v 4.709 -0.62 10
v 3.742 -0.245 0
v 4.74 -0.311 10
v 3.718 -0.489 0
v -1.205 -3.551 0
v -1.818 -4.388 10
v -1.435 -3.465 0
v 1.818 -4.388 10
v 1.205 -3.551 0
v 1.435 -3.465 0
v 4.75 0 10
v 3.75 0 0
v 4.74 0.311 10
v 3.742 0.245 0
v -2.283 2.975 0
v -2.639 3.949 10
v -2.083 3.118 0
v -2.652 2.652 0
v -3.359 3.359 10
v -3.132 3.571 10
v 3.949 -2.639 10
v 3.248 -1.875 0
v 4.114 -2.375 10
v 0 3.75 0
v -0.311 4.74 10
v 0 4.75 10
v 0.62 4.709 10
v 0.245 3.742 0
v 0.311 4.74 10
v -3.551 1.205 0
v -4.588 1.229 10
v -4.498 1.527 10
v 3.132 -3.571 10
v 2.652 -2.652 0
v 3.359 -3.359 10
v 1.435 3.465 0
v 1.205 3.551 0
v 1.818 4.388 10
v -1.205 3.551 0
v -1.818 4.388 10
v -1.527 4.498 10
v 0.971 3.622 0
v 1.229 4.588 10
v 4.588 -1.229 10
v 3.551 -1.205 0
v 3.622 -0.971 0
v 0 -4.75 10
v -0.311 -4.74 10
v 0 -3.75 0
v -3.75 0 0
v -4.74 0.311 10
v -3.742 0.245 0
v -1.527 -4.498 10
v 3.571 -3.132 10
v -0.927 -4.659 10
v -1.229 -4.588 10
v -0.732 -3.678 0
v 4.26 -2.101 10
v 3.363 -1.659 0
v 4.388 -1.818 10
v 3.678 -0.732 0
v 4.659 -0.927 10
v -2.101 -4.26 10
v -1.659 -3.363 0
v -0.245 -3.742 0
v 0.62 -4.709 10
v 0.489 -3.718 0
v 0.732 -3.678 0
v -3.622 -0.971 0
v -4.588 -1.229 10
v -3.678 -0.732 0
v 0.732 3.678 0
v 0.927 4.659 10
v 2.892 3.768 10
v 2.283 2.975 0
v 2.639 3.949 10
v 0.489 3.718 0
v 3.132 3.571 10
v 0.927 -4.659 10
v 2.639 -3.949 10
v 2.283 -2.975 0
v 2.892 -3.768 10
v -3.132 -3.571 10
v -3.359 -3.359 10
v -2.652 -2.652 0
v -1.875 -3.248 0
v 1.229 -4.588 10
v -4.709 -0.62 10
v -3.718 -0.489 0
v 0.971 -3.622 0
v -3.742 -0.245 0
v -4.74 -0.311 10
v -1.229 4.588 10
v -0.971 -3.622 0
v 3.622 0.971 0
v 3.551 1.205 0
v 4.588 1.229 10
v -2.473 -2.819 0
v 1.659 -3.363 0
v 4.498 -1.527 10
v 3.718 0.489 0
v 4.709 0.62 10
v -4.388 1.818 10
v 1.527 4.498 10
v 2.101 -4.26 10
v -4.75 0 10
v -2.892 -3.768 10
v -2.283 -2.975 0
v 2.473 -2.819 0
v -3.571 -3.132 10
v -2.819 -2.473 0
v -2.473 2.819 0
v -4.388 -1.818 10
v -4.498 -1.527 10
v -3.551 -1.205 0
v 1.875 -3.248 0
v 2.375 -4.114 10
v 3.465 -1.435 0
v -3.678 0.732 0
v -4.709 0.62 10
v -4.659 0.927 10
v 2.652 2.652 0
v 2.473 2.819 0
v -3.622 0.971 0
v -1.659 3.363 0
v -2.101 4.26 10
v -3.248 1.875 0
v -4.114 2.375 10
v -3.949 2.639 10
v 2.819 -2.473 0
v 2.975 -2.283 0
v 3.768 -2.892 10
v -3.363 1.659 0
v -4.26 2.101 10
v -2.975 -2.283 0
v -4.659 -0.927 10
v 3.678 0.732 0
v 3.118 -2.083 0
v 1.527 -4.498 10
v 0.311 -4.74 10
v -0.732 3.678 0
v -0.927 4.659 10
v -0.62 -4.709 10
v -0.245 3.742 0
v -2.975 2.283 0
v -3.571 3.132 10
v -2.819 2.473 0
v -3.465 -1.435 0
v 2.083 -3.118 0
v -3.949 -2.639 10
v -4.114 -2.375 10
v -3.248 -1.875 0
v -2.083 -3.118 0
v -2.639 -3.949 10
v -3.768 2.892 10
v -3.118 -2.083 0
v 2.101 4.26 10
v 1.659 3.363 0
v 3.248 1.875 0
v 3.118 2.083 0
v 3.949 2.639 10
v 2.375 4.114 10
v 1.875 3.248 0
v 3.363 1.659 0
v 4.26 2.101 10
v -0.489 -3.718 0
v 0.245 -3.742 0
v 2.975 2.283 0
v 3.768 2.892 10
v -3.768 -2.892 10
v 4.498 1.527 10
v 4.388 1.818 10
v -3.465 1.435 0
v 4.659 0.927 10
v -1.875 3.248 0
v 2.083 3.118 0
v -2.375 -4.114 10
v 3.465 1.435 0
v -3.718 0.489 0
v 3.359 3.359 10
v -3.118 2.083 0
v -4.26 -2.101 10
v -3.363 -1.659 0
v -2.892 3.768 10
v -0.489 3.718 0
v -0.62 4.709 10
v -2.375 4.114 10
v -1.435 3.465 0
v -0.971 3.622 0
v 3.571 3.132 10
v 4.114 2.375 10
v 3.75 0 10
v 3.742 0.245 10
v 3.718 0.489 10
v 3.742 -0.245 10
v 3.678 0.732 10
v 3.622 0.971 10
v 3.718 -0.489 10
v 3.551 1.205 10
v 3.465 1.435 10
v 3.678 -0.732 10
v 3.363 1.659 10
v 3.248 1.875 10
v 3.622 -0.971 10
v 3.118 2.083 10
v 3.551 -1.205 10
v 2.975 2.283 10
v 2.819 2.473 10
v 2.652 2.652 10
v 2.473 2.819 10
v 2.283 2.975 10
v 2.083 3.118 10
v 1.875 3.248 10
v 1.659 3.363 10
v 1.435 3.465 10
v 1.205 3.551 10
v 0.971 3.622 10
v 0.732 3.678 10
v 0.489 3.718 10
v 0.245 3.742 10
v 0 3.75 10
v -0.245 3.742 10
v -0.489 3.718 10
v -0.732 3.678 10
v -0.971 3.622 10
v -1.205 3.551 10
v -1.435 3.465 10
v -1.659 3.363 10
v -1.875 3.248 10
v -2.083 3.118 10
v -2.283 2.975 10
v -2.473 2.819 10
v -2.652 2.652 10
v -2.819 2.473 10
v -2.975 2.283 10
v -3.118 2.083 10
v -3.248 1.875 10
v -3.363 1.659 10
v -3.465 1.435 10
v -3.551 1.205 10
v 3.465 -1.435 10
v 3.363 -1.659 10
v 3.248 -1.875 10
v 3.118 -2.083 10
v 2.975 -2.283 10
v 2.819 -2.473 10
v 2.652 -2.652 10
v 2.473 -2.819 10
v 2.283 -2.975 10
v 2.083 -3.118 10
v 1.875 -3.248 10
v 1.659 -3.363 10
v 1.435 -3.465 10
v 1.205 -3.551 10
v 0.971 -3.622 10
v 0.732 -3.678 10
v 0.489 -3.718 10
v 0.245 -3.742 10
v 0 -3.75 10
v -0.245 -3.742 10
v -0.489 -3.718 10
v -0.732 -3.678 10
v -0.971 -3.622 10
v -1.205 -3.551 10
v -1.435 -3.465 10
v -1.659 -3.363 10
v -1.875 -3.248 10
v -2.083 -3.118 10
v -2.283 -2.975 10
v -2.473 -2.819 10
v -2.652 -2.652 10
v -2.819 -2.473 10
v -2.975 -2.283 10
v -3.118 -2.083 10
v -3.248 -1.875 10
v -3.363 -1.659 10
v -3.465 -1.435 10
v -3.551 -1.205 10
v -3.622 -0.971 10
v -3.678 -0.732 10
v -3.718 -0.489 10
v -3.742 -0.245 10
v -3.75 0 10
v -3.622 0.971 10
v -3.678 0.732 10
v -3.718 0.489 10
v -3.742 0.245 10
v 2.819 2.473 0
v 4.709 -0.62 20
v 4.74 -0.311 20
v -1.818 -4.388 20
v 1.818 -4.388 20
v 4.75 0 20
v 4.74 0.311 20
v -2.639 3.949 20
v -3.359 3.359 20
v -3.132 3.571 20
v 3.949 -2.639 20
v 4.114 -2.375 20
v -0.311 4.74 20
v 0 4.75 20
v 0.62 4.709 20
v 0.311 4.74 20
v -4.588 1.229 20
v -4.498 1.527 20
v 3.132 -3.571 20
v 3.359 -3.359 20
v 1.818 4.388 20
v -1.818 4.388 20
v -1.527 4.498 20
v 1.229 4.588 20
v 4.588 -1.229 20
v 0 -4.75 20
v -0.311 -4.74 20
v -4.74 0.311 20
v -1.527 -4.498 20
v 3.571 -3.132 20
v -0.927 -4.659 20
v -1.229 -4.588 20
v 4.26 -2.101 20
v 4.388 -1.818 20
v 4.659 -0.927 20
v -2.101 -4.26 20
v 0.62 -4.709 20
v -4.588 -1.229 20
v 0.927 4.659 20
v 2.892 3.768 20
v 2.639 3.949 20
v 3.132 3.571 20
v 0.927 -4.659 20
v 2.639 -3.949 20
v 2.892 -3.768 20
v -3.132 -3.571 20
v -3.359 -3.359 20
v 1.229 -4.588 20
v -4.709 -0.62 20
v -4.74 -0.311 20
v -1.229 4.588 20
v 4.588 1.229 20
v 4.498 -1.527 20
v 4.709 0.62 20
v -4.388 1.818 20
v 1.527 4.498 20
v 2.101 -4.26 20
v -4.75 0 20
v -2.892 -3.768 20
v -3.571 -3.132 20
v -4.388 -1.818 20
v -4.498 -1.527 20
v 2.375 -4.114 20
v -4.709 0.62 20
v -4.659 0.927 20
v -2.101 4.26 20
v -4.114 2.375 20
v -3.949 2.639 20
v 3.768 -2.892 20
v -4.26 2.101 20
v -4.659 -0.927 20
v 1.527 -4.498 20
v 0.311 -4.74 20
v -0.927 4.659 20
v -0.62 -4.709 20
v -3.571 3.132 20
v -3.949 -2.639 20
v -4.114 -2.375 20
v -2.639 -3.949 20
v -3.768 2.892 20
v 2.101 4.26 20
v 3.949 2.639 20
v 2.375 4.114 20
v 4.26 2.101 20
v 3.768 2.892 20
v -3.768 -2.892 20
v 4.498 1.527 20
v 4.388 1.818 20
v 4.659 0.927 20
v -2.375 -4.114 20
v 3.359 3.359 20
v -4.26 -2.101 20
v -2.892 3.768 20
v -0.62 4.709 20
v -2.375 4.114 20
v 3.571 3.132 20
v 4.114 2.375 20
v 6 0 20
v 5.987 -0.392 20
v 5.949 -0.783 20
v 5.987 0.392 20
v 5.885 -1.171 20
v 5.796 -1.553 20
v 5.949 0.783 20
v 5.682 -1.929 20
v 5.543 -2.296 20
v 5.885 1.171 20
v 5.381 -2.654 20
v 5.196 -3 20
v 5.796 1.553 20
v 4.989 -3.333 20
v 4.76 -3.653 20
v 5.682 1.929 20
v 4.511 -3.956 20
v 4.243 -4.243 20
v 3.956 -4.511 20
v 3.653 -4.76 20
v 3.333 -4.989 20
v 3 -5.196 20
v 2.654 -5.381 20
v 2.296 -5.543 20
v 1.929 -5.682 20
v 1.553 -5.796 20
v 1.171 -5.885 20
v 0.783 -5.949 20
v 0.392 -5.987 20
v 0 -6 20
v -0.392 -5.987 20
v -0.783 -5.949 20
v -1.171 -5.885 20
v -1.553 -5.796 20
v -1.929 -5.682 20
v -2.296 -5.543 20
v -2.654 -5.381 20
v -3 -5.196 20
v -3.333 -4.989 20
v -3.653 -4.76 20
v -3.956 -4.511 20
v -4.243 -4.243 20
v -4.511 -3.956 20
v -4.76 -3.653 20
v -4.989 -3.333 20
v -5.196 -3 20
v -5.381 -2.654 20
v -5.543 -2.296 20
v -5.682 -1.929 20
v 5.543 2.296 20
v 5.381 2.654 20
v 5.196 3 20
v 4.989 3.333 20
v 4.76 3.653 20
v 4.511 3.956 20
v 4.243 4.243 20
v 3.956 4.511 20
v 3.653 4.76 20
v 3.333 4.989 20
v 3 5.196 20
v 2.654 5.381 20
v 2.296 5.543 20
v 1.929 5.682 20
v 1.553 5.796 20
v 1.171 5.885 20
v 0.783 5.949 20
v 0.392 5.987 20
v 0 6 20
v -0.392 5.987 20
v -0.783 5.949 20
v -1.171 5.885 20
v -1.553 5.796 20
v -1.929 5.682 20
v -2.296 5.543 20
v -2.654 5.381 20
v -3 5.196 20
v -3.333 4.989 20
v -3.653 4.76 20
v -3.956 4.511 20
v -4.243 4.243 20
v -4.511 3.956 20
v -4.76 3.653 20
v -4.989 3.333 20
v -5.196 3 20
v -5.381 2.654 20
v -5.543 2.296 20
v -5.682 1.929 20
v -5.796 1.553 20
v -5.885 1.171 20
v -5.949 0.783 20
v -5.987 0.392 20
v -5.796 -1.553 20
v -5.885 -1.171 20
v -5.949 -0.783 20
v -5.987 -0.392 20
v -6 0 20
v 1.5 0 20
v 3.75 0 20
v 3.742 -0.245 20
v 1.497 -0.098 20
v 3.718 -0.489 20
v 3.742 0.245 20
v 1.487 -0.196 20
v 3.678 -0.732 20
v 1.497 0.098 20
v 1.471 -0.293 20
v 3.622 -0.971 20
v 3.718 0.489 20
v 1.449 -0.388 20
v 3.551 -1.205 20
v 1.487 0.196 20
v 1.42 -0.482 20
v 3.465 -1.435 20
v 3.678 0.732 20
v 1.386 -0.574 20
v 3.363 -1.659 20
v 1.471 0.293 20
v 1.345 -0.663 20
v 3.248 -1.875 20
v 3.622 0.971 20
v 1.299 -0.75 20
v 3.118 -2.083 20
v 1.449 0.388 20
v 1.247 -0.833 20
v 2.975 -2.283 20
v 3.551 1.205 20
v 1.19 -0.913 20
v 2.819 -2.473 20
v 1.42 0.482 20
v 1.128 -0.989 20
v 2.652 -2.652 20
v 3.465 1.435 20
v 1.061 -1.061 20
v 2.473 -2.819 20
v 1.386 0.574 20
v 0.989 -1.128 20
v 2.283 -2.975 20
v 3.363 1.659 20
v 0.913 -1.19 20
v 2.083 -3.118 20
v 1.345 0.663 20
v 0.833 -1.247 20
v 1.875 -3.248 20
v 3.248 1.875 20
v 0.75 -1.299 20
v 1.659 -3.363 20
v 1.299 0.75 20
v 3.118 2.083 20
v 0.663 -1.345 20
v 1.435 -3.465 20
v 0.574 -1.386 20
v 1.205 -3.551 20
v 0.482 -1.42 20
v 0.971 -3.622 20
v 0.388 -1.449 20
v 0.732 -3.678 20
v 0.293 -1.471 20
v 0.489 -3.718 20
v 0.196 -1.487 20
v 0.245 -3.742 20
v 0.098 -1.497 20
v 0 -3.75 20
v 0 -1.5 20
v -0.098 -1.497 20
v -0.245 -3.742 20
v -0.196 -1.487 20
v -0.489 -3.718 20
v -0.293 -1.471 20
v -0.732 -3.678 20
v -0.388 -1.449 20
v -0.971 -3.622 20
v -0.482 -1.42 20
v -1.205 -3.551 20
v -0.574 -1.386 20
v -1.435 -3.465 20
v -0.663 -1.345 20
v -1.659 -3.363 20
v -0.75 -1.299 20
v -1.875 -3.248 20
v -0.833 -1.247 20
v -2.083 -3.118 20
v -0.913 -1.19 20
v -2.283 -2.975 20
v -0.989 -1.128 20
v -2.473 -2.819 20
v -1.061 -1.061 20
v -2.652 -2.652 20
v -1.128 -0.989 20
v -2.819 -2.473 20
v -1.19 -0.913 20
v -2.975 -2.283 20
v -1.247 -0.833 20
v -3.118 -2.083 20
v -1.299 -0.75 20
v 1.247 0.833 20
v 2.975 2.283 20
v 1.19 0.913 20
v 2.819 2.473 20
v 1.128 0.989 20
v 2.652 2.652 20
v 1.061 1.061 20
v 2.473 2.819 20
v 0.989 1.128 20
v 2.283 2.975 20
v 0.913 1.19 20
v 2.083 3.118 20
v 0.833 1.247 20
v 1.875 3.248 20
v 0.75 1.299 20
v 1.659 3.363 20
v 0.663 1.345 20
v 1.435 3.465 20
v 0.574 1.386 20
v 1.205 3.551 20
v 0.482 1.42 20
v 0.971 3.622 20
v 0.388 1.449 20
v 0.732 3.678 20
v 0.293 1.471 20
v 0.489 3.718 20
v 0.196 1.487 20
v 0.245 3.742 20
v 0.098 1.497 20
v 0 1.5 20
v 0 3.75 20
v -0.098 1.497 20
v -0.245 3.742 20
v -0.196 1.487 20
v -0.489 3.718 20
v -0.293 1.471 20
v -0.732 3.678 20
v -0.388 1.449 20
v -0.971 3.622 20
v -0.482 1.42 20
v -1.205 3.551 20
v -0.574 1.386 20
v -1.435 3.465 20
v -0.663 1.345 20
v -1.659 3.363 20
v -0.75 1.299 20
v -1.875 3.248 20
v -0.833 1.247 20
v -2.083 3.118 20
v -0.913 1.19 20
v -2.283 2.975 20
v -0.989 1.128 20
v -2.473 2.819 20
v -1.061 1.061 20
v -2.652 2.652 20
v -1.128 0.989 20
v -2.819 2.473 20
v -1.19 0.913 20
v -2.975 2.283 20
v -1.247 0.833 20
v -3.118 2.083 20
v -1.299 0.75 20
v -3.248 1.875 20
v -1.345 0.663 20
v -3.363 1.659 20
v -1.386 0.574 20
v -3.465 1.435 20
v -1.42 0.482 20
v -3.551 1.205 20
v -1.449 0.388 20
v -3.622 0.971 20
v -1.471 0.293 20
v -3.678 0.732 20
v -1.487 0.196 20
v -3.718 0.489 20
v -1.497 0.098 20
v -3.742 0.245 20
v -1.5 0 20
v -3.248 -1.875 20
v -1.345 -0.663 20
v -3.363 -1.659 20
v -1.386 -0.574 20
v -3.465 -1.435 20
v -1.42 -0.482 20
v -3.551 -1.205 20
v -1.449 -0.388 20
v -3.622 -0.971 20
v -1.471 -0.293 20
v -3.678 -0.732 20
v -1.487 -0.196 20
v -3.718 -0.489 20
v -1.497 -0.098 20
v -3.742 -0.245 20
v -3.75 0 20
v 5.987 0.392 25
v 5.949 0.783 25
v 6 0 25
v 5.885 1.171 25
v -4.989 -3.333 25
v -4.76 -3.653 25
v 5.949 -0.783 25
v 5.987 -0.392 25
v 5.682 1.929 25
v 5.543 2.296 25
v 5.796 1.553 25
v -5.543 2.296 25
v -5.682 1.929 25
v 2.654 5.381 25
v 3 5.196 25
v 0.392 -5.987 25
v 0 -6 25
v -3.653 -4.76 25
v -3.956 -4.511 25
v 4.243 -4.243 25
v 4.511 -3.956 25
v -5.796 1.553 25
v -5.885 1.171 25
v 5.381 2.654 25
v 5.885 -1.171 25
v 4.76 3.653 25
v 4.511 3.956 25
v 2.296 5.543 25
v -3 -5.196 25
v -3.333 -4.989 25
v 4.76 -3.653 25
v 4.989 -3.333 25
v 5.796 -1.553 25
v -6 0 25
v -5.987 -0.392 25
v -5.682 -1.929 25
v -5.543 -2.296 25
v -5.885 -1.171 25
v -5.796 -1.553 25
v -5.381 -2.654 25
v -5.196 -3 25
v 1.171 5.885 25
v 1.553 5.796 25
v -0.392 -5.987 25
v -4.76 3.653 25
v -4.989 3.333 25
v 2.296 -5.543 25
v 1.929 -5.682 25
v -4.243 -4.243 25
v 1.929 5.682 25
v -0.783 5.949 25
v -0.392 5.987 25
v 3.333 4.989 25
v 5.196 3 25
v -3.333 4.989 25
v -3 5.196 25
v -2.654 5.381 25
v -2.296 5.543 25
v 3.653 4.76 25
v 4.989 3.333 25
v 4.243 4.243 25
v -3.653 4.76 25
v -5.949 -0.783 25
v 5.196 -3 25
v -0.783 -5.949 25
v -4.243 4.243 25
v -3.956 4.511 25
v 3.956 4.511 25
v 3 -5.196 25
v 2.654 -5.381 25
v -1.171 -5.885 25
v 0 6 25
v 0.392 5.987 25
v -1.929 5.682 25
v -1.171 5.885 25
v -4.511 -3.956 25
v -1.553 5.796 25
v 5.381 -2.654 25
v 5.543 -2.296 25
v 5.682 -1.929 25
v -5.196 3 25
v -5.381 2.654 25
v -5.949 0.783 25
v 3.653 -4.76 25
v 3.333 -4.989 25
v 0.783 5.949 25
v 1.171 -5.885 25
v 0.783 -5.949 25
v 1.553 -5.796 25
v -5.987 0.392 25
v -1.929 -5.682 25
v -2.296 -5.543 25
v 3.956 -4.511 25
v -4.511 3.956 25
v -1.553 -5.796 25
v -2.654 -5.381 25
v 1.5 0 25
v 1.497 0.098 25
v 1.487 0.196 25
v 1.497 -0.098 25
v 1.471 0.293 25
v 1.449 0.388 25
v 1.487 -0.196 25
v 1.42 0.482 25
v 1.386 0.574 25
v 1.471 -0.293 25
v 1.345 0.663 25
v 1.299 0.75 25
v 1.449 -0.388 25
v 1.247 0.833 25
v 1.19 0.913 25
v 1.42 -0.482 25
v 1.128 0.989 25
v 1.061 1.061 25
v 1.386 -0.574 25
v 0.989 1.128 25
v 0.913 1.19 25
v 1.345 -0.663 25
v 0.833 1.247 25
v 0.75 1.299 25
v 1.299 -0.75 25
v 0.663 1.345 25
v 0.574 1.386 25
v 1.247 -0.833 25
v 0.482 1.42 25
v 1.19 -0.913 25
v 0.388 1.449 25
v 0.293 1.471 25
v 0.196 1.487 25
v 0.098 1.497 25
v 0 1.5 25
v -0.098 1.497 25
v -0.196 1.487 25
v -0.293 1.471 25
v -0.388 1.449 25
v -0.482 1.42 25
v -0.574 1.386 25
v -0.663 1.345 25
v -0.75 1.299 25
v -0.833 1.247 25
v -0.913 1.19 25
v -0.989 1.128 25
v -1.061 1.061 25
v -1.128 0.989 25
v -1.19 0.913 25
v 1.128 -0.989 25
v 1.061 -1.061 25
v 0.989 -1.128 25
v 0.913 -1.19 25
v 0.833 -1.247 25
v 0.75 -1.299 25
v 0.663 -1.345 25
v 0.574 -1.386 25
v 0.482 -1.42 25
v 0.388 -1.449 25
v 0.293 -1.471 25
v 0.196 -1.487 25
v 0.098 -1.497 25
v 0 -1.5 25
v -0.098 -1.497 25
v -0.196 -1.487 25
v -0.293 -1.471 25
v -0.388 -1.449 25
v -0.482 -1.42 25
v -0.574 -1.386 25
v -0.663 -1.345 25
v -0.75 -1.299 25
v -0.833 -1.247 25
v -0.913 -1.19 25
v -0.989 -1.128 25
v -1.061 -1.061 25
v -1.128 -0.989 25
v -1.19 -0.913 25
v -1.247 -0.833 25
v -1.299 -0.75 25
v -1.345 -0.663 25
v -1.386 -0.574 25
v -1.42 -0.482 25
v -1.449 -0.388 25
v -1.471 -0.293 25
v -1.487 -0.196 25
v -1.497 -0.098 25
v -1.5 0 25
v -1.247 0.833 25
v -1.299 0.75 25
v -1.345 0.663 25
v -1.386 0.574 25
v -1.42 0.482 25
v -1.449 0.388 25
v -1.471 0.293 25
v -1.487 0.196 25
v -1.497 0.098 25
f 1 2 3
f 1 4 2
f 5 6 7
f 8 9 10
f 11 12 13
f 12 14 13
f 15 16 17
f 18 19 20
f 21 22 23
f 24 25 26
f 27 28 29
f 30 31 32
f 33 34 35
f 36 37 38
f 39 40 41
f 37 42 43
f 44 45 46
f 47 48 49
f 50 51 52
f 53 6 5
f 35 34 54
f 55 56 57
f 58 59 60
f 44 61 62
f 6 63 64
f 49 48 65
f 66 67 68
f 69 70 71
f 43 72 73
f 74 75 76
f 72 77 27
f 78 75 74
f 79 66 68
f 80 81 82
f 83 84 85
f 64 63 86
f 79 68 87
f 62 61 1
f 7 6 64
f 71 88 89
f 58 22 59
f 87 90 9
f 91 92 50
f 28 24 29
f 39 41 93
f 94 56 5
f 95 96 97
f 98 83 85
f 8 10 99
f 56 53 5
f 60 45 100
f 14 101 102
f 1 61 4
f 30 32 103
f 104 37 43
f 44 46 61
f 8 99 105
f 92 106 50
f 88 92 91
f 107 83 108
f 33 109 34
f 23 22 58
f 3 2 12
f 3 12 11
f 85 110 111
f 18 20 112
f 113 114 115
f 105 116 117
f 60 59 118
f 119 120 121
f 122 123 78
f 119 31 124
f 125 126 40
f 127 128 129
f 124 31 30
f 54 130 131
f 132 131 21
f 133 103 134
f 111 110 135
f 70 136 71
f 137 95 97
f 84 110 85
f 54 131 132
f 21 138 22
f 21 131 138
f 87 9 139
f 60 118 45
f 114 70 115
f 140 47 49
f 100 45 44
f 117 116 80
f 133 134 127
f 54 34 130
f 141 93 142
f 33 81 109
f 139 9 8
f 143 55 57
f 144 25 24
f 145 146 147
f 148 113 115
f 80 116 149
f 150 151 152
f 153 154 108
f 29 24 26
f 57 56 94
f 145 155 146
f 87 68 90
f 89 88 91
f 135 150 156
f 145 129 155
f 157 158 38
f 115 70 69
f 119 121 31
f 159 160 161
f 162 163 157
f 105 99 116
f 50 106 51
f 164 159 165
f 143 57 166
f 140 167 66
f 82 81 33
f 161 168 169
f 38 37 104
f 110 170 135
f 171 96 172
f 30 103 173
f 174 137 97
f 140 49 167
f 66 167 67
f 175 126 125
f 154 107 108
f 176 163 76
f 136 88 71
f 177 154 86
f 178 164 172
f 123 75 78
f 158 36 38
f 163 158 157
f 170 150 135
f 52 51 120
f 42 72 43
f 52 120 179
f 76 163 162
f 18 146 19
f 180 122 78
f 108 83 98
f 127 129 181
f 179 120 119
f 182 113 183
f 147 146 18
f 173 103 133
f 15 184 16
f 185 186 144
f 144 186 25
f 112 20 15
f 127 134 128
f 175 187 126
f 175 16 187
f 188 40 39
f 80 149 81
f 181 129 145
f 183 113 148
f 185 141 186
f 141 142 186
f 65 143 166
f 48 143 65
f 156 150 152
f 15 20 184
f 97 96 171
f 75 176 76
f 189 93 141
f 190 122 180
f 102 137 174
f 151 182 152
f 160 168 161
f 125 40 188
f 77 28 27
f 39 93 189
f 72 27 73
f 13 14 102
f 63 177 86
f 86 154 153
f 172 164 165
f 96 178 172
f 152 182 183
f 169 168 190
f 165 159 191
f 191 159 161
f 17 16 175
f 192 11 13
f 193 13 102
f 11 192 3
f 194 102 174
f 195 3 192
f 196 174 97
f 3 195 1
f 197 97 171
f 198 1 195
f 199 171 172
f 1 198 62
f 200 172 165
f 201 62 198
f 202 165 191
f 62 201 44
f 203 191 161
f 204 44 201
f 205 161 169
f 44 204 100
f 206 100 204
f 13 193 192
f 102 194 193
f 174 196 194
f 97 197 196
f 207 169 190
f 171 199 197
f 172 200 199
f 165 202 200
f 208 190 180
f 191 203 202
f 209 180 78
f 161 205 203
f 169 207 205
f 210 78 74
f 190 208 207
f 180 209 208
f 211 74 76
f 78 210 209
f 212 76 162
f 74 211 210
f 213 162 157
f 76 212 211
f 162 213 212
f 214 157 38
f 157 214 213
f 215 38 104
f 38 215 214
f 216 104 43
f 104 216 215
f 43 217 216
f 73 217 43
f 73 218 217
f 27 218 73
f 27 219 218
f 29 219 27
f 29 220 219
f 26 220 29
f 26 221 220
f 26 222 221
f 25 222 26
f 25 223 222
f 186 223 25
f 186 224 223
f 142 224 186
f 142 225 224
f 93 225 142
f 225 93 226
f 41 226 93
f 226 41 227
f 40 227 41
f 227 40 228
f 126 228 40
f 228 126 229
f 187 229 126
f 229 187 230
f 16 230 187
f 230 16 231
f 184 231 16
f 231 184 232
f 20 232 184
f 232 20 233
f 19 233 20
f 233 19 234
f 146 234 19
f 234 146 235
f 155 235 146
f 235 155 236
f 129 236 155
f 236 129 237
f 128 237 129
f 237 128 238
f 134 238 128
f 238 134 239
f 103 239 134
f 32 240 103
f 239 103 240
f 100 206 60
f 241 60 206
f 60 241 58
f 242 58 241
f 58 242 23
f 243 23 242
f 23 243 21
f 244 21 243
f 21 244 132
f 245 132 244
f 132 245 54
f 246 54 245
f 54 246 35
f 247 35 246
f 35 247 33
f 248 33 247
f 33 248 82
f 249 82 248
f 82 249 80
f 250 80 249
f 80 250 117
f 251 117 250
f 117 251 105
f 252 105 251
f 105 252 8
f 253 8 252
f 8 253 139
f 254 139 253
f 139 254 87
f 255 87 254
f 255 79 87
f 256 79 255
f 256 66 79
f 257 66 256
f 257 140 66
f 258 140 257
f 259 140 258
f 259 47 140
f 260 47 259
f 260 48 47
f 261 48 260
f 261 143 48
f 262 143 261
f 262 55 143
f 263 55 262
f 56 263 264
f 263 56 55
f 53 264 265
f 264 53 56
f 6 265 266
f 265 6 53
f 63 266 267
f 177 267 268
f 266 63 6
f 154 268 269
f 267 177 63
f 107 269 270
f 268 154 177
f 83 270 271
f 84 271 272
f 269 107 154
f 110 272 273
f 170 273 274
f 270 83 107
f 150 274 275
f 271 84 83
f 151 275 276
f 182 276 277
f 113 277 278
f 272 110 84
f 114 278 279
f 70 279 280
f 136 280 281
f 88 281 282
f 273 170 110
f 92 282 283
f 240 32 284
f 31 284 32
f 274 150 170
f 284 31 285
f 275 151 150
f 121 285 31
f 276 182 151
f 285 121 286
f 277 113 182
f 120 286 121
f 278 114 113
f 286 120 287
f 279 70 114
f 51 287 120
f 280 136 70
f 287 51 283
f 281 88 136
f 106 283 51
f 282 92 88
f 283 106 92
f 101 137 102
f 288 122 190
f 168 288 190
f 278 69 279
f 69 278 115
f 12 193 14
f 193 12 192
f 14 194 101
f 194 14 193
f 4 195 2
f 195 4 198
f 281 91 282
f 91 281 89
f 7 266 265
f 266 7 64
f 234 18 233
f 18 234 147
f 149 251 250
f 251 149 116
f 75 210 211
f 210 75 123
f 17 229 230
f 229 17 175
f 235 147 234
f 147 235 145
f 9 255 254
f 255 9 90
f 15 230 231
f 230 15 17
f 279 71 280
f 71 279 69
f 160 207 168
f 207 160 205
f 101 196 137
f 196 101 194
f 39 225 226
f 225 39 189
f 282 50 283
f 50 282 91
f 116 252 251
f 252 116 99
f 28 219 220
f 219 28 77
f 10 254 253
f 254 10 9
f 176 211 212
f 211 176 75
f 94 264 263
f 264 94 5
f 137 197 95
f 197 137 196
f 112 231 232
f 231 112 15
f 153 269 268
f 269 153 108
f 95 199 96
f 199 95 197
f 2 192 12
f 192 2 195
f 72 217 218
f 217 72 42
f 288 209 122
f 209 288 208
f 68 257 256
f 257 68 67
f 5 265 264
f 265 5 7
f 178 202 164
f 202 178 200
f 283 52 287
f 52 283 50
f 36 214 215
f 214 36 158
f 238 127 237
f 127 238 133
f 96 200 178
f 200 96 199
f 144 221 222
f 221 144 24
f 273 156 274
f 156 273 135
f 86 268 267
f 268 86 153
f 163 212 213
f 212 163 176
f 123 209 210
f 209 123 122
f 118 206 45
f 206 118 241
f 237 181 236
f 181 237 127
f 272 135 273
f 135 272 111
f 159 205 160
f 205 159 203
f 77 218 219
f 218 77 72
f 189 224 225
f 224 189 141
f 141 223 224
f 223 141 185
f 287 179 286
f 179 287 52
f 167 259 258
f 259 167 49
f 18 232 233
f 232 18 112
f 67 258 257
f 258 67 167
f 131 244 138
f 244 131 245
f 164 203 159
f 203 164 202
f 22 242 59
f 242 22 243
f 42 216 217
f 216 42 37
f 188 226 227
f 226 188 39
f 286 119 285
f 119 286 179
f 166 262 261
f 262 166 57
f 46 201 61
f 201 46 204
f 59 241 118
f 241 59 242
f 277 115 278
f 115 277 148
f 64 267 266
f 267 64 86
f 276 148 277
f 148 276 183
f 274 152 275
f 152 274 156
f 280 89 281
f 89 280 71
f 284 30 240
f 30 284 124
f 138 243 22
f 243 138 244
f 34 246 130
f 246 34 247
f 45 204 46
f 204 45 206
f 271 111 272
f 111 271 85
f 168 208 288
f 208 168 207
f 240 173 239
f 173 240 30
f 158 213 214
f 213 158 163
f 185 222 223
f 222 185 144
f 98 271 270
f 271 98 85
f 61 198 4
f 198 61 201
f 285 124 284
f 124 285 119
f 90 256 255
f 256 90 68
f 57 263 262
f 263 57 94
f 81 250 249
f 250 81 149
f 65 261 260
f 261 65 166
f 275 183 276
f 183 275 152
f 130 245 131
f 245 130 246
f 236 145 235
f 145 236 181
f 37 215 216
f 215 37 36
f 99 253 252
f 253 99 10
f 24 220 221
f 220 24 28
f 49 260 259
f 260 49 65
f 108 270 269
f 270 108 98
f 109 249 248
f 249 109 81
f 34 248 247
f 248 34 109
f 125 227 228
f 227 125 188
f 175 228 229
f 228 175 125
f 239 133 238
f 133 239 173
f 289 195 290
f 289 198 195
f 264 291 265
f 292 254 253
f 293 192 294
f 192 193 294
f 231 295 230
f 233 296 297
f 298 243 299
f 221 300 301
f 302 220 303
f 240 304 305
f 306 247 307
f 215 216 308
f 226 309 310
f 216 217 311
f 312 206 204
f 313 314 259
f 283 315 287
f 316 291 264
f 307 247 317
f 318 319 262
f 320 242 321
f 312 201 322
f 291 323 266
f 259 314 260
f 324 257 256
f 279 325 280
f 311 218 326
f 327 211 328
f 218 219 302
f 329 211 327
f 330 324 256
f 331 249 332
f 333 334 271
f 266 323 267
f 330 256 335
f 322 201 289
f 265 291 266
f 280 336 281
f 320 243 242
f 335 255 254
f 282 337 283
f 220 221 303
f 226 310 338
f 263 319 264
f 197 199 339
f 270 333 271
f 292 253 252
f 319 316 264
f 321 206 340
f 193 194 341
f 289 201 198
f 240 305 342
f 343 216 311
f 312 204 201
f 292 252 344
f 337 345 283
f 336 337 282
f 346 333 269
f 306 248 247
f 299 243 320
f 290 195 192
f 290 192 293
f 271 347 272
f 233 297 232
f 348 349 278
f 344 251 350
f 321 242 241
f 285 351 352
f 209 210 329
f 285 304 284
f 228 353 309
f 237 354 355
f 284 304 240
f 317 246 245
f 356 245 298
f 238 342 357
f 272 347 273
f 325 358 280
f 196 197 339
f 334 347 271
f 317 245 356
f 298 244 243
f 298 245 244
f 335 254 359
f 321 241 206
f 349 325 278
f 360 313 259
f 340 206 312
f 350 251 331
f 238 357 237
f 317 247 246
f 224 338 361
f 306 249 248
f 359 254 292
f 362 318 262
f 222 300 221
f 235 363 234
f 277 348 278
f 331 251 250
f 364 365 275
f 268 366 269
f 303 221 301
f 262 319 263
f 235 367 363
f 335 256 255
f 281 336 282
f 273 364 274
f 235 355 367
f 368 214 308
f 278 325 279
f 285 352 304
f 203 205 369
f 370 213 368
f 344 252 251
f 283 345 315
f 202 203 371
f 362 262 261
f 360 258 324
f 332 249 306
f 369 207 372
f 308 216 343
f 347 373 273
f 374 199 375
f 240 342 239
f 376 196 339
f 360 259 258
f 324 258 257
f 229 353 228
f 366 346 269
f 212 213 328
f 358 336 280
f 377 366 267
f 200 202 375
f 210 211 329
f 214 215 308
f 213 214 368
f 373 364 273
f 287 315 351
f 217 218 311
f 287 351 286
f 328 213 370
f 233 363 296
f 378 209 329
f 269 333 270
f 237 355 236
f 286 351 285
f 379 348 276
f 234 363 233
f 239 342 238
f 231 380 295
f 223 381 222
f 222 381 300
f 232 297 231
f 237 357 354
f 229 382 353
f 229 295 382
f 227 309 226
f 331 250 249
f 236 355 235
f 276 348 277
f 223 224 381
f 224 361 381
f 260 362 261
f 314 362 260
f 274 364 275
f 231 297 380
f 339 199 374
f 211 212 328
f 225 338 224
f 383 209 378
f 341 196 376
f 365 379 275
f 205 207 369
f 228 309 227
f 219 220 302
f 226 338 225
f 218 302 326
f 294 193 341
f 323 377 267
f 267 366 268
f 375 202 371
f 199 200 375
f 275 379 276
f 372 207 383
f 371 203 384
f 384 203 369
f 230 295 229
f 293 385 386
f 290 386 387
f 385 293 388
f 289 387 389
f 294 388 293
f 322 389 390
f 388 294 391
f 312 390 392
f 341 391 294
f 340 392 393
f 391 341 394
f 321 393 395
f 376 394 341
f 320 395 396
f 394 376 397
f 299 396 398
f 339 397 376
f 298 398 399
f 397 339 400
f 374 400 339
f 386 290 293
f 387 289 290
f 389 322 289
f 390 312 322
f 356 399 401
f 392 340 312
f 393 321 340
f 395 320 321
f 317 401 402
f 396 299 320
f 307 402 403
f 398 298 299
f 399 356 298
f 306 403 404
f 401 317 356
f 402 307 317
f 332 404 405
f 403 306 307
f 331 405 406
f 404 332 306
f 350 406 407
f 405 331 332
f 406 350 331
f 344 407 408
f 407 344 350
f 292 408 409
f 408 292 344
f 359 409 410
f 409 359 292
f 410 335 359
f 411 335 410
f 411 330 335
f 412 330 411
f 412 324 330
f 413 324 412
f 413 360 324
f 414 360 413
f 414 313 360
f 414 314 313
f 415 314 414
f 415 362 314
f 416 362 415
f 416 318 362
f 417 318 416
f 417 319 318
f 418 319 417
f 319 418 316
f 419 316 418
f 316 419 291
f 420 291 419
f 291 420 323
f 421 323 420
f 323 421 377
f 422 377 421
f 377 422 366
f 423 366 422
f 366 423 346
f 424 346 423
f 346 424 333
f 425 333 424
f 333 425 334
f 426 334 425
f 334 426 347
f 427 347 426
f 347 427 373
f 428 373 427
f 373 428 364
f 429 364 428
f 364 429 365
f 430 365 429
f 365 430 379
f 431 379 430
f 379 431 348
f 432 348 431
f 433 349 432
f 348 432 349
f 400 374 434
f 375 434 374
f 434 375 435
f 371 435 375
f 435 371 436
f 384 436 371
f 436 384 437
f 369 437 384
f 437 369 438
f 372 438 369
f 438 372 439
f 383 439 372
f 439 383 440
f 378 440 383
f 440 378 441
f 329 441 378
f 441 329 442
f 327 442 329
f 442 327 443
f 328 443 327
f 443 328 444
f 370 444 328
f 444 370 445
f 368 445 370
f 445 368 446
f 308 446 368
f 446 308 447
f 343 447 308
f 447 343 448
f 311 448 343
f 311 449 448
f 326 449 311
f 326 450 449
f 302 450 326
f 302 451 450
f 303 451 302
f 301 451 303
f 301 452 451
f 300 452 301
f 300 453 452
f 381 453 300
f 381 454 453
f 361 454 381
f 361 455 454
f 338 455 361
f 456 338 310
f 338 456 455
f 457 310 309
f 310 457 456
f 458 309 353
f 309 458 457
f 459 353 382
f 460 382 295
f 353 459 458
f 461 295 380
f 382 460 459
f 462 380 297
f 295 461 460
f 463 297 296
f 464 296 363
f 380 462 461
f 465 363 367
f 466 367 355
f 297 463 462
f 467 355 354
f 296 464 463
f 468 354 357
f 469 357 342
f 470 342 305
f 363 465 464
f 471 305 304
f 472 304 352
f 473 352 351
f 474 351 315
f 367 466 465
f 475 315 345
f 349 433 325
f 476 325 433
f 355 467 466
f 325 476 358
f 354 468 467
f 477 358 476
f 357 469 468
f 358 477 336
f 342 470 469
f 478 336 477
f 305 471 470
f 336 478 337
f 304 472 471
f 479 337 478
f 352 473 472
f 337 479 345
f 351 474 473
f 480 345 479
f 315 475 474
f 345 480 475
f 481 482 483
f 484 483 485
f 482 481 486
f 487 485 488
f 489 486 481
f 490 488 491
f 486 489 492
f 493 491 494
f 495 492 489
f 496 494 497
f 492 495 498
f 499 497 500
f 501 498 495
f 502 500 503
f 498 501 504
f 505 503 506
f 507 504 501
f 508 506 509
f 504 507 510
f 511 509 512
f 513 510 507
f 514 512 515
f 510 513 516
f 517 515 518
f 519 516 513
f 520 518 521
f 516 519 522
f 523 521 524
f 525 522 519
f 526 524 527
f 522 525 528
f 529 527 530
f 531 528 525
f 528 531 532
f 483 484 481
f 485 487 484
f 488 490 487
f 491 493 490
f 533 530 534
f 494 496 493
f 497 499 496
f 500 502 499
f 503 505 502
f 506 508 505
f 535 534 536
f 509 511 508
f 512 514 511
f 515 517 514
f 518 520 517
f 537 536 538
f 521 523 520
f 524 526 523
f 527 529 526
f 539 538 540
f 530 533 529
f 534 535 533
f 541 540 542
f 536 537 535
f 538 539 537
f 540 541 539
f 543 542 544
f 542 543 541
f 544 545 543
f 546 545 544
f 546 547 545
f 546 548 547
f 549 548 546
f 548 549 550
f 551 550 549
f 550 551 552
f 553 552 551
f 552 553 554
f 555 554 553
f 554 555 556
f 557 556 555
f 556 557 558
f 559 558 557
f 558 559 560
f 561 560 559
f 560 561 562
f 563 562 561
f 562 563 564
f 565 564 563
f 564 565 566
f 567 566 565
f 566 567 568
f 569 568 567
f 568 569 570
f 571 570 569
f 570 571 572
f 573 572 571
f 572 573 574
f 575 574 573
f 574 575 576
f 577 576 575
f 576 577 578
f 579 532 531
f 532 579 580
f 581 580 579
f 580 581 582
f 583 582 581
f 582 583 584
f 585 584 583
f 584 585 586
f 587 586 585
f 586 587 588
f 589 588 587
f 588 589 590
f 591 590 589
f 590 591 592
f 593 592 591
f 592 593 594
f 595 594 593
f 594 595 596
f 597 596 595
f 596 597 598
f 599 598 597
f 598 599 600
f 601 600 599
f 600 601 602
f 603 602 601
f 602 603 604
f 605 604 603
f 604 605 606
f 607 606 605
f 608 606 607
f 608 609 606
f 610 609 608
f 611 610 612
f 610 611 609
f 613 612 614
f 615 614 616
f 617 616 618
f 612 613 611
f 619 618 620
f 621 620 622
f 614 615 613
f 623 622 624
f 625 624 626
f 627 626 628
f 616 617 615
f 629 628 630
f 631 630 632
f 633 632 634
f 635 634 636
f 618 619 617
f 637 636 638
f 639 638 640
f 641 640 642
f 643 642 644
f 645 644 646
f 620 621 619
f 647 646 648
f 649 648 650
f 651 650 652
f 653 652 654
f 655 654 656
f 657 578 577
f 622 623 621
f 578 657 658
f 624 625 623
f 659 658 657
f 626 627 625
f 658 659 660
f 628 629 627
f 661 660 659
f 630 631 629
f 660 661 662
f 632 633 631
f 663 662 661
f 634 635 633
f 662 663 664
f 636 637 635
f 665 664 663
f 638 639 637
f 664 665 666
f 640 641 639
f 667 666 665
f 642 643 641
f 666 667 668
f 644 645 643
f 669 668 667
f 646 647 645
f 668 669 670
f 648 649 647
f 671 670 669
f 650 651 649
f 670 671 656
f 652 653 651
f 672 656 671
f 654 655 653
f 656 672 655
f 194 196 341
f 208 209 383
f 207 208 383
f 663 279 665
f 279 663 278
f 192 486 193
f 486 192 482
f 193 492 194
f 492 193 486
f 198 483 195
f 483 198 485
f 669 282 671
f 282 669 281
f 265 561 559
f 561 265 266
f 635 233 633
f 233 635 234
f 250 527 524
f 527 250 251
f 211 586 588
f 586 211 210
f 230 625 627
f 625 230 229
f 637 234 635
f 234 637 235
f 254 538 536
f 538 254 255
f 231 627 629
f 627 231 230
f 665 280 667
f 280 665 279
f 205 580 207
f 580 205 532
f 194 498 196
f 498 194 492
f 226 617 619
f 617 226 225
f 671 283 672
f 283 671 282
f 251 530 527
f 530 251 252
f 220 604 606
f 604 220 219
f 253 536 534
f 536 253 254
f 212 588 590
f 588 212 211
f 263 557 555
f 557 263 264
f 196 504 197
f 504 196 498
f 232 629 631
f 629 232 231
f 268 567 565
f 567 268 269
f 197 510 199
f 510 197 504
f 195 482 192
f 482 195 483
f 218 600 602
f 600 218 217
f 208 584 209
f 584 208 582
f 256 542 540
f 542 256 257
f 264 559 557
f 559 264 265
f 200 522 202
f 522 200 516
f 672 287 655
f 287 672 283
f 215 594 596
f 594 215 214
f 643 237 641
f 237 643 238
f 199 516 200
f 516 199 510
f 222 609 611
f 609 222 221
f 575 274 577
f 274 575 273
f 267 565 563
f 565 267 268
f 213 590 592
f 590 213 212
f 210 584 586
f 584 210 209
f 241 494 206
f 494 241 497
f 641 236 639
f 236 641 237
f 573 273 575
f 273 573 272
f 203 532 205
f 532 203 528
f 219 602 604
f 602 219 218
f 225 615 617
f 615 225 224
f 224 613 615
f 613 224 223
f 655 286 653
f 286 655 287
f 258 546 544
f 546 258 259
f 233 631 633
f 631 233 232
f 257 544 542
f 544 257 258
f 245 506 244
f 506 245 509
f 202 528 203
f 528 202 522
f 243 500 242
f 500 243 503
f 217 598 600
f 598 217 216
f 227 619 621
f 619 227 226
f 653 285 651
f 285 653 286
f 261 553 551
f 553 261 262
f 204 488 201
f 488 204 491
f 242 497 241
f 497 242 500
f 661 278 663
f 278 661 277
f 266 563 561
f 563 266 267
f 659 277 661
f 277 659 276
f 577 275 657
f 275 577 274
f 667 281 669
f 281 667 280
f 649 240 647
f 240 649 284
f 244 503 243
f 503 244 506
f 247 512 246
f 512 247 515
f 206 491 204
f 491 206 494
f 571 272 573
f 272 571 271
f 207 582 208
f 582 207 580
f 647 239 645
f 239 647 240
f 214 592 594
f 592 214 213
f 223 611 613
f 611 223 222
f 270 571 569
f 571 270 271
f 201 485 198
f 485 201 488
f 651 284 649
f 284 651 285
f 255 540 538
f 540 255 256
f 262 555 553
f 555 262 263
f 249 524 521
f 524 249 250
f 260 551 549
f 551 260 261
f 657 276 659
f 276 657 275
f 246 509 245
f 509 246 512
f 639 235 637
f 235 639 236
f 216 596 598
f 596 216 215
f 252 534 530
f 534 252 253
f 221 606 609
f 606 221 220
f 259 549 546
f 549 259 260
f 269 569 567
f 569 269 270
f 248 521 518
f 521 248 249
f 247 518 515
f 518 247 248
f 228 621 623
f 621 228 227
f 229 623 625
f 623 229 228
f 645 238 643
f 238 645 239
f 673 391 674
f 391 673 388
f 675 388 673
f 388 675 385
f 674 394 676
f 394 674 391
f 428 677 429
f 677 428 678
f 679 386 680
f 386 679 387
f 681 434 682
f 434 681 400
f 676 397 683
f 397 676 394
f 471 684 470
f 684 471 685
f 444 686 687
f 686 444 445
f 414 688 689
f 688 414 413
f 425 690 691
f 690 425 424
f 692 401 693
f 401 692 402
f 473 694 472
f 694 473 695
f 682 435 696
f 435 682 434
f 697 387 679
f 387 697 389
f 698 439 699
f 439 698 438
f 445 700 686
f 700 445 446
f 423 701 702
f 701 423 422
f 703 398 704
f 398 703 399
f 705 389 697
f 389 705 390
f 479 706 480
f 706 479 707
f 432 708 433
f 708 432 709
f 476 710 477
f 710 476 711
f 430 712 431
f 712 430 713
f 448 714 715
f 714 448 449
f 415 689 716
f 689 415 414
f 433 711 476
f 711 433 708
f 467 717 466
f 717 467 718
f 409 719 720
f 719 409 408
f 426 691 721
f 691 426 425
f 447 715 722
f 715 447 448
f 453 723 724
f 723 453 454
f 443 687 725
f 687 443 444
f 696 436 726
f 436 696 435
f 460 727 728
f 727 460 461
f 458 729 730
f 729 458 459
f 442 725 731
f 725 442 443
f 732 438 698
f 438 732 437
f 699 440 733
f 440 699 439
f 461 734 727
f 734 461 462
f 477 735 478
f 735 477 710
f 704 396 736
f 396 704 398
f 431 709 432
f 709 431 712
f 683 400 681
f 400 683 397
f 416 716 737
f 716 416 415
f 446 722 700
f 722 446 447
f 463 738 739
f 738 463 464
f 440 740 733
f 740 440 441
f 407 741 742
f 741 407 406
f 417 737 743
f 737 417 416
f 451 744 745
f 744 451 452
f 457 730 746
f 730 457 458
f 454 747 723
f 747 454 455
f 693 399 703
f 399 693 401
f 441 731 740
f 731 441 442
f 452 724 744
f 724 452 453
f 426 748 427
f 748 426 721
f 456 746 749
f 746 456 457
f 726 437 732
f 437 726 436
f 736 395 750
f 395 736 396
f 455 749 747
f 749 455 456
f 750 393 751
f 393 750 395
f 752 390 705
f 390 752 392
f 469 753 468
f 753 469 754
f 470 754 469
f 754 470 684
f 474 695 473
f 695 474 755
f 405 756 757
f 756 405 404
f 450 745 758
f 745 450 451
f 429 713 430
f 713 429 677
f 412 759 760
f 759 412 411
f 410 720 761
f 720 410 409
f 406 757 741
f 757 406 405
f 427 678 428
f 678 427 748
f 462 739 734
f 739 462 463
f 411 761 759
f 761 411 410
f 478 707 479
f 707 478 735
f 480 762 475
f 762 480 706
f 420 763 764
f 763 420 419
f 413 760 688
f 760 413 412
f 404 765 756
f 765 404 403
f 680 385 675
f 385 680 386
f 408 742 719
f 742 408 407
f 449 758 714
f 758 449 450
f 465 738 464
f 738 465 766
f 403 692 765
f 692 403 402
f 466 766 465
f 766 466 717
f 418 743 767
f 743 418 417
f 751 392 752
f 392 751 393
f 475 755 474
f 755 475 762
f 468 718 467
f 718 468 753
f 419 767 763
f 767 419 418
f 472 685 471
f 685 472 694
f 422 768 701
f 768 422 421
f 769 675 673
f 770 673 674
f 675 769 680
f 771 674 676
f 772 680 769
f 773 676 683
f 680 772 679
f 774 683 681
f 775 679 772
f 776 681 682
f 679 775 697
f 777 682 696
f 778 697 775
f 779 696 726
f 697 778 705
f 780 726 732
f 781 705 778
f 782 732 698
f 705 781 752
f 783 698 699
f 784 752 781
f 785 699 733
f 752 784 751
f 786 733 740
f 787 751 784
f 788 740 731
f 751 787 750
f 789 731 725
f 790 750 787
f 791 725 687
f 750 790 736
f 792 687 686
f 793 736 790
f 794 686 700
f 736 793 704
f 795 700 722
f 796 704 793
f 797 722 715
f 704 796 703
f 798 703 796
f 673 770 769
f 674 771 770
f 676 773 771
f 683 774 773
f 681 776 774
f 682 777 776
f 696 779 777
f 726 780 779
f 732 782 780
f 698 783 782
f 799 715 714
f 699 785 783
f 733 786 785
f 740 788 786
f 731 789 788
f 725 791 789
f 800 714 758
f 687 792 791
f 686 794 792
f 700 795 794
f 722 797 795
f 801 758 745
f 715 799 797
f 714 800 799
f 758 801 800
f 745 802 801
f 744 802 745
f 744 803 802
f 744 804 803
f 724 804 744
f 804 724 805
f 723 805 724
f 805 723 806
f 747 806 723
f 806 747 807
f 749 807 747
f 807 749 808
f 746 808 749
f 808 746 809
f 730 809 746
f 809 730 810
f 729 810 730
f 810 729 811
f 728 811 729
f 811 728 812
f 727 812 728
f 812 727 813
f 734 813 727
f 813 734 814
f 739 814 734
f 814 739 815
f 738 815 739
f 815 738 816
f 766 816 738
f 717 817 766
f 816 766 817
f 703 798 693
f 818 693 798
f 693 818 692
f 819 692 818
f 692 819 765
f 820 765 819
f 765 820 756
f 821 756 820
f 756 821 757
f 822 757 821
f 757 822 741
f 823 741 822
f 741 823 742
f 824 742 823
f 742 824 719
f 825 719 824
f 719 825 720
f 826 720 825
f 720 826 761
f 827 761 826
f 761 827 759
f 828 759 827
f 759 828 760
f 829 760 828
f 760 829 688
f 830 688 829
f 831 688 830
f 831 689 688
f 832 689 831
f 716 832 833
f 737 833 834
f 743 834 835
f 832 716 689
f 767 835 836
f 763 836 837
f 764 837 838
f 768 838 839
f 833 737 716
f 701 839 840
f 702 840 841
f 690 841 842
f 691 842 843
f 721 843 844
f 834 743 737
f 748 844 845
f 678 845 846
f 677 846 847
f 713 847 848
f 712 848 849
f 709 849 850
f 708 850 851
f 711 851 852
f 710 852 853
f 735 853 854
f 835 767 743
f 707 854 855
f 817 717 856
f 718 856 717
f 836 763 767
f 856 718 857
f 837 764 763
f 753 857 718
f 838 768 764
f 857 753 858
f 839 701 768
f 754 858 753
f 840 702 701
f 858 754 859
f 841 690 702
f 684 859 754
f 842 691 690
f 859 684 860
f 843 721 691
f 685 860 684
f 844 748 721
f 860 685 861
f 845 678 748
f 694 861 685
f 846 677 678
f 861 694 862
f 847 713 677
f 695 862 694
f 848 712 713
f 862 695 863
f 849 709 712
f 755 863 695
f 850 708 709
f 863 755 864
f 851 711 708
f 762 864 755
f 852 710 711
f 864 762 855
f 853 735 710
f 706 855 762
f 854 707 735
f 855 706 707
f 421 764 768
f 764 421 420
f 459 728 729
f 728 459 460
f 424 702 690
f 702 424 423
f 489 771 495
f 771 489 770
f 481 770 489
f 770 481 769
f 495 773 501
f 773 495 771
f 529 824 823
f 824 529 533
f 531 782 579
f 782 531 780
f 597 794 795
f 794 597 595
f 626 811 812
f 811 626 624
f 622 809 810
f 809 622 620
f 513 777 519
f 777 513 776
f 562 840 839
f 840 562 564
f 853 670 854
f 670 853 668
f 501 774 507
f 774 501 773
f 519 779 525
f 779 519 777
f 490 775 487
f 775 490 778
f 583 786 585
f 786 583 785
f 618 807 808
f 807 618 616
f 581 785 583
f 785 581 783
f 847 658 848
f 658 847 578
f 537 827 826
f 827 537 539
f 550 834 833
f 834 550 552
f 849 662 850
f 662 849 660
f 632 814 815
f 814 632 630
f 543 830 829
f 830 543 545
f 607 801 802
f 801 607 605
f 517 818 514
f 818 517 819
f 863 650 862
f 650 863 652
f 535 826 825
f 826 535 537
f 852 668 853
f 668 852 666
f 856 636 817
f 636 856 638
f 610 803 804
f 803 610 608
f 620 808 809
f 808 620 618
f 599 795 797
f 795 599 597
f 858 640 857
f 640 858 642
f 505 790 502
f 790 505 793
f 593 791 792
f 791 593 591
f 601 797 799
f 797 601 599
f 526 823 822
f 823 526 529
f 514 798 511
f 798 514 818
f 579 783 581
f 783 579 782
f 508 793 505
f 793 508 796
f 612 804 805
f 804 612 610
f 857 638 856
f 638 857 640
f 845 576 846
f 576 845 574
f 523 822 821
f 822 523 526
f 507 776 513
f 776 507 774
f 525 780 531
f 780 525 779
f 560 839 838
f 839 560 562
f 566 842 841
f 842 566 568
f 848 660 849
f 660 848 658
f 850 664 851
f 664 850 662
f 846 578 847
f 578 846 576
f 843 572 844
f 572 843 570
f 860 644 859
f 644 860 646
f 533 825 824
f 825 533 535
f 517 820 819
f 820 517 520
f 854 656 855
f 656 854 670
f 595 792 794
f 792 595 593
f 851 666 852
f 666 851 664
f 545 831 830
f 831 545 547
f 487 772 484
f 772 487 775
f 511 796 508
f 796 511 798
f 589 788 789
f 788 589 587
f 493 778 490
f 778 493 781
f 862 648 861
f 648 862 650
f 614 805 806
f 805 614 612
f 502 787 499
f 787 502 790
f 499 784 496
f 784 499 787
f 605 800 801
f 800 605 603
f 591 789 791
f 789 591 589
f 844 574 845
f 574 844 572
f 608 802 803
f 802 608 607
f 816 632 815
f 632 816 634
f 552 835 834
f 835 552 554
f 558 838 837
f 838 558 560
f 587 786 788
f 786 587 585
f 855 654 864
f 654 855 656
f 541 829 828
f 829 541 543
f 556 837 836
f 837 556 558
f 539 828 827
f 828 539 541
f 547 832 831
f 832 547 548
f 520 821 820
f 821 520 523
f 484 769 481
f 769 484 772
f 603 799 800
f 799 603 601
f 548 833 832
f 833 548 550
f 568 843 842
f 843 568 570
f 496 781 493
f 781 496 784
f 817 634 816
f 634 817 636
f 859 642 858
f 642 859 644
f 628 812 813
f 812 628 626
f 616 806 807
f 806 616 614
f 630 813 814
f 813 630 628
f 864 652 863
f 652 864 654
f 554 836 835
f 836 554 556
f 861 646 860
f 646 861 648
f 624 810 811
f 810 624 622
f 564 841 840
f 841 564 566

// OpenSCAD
// Hose-barb reducer: joins 8 mm ID silicone tubing to 5 mm ID silicone tubing
// Print orientation: standing upright along +Z, resting on z = 0

// ---------------- Parameters ----------------
reducer_length   = 41;   // total length of part (z = 0 to z = 41)
bore             = 3;    // through-bore diameter
barb_8_start_d   = 7.5;  // outer diameter of 8 mm tubing barbs at bottom
barb_8_top_d     = 9.5;  // outer diameter of 8 mm tubing barbs at top
barb_8_height    = 10;   // height of each 8 mm tubing barb
barb_8_step_d    = 7.5;  // diameter after the sawtooth step back
barb_5_start_d   = 6.5;  // outer diameter of 5 mm tubing barbs at bottom
barb_5_top_d     = 5.0;  // outer diameter of 5 mm tubing barbs at top
barb_5_height    = 8;    // height of each 5 mm tubing barb
barb_5_step_d    = 6.5;  // diameter after the sawtooth step back out
collar_d         = 12;   // diameter of the cylindrical collar
collar_h         = 5;    // height of the collar (z = 20 to z = 25)
eps              = 0.5;  // overshoot for clean boolean cuts

$fn = 96;

// ---------------- Modules ----------------
module sawtooth_barb(d_start, d_top, h, step_d) {
    // Barb with sawtooth profile: grows linearly, then steps back
    // Print orientation: pointy end up (+Z)
    difference() {
        union() {
            cylinder(h = h, d1 = d_start, d2 = d_top);
            translate([0, 0, d_top / 2])
                cylinder(h = eps, d = step_d);
        }
        translate([0, 0, -eps])
            cylinder(h = h + 2 * eps, d = d_start);
    }
}

// ---------------- Part ----------------
difference() {
    union() {
        // 8 mm tubing barbs (z = 0 to 20)
        for (i = [0, 1])
            translate([0, 0, i * barb_8_height])
                sawtooth_barb(barb_8_start_d, barb_8_top_d, barb_8_height, barb_8_step_d);

        // Collar (z = 20 to 25)
        translate([0, 0, 20])
            cylinder(h = collar_h, d = collar_d);

        // 5 mm tubing barbs (z = 25 to 41)
        for (i = [0, 1])
            translate([0, 0, 25 + i * barb_5_height])
                sawtooth_barb(barb_5_start_d, barb_5_top_d, barb_5_height, barb_5_step_d);
    }

    // Through-bore
    translate([0, 0, -eps])
        cylinder(h = reducer_length + 2 * eps, d = bore);
}
